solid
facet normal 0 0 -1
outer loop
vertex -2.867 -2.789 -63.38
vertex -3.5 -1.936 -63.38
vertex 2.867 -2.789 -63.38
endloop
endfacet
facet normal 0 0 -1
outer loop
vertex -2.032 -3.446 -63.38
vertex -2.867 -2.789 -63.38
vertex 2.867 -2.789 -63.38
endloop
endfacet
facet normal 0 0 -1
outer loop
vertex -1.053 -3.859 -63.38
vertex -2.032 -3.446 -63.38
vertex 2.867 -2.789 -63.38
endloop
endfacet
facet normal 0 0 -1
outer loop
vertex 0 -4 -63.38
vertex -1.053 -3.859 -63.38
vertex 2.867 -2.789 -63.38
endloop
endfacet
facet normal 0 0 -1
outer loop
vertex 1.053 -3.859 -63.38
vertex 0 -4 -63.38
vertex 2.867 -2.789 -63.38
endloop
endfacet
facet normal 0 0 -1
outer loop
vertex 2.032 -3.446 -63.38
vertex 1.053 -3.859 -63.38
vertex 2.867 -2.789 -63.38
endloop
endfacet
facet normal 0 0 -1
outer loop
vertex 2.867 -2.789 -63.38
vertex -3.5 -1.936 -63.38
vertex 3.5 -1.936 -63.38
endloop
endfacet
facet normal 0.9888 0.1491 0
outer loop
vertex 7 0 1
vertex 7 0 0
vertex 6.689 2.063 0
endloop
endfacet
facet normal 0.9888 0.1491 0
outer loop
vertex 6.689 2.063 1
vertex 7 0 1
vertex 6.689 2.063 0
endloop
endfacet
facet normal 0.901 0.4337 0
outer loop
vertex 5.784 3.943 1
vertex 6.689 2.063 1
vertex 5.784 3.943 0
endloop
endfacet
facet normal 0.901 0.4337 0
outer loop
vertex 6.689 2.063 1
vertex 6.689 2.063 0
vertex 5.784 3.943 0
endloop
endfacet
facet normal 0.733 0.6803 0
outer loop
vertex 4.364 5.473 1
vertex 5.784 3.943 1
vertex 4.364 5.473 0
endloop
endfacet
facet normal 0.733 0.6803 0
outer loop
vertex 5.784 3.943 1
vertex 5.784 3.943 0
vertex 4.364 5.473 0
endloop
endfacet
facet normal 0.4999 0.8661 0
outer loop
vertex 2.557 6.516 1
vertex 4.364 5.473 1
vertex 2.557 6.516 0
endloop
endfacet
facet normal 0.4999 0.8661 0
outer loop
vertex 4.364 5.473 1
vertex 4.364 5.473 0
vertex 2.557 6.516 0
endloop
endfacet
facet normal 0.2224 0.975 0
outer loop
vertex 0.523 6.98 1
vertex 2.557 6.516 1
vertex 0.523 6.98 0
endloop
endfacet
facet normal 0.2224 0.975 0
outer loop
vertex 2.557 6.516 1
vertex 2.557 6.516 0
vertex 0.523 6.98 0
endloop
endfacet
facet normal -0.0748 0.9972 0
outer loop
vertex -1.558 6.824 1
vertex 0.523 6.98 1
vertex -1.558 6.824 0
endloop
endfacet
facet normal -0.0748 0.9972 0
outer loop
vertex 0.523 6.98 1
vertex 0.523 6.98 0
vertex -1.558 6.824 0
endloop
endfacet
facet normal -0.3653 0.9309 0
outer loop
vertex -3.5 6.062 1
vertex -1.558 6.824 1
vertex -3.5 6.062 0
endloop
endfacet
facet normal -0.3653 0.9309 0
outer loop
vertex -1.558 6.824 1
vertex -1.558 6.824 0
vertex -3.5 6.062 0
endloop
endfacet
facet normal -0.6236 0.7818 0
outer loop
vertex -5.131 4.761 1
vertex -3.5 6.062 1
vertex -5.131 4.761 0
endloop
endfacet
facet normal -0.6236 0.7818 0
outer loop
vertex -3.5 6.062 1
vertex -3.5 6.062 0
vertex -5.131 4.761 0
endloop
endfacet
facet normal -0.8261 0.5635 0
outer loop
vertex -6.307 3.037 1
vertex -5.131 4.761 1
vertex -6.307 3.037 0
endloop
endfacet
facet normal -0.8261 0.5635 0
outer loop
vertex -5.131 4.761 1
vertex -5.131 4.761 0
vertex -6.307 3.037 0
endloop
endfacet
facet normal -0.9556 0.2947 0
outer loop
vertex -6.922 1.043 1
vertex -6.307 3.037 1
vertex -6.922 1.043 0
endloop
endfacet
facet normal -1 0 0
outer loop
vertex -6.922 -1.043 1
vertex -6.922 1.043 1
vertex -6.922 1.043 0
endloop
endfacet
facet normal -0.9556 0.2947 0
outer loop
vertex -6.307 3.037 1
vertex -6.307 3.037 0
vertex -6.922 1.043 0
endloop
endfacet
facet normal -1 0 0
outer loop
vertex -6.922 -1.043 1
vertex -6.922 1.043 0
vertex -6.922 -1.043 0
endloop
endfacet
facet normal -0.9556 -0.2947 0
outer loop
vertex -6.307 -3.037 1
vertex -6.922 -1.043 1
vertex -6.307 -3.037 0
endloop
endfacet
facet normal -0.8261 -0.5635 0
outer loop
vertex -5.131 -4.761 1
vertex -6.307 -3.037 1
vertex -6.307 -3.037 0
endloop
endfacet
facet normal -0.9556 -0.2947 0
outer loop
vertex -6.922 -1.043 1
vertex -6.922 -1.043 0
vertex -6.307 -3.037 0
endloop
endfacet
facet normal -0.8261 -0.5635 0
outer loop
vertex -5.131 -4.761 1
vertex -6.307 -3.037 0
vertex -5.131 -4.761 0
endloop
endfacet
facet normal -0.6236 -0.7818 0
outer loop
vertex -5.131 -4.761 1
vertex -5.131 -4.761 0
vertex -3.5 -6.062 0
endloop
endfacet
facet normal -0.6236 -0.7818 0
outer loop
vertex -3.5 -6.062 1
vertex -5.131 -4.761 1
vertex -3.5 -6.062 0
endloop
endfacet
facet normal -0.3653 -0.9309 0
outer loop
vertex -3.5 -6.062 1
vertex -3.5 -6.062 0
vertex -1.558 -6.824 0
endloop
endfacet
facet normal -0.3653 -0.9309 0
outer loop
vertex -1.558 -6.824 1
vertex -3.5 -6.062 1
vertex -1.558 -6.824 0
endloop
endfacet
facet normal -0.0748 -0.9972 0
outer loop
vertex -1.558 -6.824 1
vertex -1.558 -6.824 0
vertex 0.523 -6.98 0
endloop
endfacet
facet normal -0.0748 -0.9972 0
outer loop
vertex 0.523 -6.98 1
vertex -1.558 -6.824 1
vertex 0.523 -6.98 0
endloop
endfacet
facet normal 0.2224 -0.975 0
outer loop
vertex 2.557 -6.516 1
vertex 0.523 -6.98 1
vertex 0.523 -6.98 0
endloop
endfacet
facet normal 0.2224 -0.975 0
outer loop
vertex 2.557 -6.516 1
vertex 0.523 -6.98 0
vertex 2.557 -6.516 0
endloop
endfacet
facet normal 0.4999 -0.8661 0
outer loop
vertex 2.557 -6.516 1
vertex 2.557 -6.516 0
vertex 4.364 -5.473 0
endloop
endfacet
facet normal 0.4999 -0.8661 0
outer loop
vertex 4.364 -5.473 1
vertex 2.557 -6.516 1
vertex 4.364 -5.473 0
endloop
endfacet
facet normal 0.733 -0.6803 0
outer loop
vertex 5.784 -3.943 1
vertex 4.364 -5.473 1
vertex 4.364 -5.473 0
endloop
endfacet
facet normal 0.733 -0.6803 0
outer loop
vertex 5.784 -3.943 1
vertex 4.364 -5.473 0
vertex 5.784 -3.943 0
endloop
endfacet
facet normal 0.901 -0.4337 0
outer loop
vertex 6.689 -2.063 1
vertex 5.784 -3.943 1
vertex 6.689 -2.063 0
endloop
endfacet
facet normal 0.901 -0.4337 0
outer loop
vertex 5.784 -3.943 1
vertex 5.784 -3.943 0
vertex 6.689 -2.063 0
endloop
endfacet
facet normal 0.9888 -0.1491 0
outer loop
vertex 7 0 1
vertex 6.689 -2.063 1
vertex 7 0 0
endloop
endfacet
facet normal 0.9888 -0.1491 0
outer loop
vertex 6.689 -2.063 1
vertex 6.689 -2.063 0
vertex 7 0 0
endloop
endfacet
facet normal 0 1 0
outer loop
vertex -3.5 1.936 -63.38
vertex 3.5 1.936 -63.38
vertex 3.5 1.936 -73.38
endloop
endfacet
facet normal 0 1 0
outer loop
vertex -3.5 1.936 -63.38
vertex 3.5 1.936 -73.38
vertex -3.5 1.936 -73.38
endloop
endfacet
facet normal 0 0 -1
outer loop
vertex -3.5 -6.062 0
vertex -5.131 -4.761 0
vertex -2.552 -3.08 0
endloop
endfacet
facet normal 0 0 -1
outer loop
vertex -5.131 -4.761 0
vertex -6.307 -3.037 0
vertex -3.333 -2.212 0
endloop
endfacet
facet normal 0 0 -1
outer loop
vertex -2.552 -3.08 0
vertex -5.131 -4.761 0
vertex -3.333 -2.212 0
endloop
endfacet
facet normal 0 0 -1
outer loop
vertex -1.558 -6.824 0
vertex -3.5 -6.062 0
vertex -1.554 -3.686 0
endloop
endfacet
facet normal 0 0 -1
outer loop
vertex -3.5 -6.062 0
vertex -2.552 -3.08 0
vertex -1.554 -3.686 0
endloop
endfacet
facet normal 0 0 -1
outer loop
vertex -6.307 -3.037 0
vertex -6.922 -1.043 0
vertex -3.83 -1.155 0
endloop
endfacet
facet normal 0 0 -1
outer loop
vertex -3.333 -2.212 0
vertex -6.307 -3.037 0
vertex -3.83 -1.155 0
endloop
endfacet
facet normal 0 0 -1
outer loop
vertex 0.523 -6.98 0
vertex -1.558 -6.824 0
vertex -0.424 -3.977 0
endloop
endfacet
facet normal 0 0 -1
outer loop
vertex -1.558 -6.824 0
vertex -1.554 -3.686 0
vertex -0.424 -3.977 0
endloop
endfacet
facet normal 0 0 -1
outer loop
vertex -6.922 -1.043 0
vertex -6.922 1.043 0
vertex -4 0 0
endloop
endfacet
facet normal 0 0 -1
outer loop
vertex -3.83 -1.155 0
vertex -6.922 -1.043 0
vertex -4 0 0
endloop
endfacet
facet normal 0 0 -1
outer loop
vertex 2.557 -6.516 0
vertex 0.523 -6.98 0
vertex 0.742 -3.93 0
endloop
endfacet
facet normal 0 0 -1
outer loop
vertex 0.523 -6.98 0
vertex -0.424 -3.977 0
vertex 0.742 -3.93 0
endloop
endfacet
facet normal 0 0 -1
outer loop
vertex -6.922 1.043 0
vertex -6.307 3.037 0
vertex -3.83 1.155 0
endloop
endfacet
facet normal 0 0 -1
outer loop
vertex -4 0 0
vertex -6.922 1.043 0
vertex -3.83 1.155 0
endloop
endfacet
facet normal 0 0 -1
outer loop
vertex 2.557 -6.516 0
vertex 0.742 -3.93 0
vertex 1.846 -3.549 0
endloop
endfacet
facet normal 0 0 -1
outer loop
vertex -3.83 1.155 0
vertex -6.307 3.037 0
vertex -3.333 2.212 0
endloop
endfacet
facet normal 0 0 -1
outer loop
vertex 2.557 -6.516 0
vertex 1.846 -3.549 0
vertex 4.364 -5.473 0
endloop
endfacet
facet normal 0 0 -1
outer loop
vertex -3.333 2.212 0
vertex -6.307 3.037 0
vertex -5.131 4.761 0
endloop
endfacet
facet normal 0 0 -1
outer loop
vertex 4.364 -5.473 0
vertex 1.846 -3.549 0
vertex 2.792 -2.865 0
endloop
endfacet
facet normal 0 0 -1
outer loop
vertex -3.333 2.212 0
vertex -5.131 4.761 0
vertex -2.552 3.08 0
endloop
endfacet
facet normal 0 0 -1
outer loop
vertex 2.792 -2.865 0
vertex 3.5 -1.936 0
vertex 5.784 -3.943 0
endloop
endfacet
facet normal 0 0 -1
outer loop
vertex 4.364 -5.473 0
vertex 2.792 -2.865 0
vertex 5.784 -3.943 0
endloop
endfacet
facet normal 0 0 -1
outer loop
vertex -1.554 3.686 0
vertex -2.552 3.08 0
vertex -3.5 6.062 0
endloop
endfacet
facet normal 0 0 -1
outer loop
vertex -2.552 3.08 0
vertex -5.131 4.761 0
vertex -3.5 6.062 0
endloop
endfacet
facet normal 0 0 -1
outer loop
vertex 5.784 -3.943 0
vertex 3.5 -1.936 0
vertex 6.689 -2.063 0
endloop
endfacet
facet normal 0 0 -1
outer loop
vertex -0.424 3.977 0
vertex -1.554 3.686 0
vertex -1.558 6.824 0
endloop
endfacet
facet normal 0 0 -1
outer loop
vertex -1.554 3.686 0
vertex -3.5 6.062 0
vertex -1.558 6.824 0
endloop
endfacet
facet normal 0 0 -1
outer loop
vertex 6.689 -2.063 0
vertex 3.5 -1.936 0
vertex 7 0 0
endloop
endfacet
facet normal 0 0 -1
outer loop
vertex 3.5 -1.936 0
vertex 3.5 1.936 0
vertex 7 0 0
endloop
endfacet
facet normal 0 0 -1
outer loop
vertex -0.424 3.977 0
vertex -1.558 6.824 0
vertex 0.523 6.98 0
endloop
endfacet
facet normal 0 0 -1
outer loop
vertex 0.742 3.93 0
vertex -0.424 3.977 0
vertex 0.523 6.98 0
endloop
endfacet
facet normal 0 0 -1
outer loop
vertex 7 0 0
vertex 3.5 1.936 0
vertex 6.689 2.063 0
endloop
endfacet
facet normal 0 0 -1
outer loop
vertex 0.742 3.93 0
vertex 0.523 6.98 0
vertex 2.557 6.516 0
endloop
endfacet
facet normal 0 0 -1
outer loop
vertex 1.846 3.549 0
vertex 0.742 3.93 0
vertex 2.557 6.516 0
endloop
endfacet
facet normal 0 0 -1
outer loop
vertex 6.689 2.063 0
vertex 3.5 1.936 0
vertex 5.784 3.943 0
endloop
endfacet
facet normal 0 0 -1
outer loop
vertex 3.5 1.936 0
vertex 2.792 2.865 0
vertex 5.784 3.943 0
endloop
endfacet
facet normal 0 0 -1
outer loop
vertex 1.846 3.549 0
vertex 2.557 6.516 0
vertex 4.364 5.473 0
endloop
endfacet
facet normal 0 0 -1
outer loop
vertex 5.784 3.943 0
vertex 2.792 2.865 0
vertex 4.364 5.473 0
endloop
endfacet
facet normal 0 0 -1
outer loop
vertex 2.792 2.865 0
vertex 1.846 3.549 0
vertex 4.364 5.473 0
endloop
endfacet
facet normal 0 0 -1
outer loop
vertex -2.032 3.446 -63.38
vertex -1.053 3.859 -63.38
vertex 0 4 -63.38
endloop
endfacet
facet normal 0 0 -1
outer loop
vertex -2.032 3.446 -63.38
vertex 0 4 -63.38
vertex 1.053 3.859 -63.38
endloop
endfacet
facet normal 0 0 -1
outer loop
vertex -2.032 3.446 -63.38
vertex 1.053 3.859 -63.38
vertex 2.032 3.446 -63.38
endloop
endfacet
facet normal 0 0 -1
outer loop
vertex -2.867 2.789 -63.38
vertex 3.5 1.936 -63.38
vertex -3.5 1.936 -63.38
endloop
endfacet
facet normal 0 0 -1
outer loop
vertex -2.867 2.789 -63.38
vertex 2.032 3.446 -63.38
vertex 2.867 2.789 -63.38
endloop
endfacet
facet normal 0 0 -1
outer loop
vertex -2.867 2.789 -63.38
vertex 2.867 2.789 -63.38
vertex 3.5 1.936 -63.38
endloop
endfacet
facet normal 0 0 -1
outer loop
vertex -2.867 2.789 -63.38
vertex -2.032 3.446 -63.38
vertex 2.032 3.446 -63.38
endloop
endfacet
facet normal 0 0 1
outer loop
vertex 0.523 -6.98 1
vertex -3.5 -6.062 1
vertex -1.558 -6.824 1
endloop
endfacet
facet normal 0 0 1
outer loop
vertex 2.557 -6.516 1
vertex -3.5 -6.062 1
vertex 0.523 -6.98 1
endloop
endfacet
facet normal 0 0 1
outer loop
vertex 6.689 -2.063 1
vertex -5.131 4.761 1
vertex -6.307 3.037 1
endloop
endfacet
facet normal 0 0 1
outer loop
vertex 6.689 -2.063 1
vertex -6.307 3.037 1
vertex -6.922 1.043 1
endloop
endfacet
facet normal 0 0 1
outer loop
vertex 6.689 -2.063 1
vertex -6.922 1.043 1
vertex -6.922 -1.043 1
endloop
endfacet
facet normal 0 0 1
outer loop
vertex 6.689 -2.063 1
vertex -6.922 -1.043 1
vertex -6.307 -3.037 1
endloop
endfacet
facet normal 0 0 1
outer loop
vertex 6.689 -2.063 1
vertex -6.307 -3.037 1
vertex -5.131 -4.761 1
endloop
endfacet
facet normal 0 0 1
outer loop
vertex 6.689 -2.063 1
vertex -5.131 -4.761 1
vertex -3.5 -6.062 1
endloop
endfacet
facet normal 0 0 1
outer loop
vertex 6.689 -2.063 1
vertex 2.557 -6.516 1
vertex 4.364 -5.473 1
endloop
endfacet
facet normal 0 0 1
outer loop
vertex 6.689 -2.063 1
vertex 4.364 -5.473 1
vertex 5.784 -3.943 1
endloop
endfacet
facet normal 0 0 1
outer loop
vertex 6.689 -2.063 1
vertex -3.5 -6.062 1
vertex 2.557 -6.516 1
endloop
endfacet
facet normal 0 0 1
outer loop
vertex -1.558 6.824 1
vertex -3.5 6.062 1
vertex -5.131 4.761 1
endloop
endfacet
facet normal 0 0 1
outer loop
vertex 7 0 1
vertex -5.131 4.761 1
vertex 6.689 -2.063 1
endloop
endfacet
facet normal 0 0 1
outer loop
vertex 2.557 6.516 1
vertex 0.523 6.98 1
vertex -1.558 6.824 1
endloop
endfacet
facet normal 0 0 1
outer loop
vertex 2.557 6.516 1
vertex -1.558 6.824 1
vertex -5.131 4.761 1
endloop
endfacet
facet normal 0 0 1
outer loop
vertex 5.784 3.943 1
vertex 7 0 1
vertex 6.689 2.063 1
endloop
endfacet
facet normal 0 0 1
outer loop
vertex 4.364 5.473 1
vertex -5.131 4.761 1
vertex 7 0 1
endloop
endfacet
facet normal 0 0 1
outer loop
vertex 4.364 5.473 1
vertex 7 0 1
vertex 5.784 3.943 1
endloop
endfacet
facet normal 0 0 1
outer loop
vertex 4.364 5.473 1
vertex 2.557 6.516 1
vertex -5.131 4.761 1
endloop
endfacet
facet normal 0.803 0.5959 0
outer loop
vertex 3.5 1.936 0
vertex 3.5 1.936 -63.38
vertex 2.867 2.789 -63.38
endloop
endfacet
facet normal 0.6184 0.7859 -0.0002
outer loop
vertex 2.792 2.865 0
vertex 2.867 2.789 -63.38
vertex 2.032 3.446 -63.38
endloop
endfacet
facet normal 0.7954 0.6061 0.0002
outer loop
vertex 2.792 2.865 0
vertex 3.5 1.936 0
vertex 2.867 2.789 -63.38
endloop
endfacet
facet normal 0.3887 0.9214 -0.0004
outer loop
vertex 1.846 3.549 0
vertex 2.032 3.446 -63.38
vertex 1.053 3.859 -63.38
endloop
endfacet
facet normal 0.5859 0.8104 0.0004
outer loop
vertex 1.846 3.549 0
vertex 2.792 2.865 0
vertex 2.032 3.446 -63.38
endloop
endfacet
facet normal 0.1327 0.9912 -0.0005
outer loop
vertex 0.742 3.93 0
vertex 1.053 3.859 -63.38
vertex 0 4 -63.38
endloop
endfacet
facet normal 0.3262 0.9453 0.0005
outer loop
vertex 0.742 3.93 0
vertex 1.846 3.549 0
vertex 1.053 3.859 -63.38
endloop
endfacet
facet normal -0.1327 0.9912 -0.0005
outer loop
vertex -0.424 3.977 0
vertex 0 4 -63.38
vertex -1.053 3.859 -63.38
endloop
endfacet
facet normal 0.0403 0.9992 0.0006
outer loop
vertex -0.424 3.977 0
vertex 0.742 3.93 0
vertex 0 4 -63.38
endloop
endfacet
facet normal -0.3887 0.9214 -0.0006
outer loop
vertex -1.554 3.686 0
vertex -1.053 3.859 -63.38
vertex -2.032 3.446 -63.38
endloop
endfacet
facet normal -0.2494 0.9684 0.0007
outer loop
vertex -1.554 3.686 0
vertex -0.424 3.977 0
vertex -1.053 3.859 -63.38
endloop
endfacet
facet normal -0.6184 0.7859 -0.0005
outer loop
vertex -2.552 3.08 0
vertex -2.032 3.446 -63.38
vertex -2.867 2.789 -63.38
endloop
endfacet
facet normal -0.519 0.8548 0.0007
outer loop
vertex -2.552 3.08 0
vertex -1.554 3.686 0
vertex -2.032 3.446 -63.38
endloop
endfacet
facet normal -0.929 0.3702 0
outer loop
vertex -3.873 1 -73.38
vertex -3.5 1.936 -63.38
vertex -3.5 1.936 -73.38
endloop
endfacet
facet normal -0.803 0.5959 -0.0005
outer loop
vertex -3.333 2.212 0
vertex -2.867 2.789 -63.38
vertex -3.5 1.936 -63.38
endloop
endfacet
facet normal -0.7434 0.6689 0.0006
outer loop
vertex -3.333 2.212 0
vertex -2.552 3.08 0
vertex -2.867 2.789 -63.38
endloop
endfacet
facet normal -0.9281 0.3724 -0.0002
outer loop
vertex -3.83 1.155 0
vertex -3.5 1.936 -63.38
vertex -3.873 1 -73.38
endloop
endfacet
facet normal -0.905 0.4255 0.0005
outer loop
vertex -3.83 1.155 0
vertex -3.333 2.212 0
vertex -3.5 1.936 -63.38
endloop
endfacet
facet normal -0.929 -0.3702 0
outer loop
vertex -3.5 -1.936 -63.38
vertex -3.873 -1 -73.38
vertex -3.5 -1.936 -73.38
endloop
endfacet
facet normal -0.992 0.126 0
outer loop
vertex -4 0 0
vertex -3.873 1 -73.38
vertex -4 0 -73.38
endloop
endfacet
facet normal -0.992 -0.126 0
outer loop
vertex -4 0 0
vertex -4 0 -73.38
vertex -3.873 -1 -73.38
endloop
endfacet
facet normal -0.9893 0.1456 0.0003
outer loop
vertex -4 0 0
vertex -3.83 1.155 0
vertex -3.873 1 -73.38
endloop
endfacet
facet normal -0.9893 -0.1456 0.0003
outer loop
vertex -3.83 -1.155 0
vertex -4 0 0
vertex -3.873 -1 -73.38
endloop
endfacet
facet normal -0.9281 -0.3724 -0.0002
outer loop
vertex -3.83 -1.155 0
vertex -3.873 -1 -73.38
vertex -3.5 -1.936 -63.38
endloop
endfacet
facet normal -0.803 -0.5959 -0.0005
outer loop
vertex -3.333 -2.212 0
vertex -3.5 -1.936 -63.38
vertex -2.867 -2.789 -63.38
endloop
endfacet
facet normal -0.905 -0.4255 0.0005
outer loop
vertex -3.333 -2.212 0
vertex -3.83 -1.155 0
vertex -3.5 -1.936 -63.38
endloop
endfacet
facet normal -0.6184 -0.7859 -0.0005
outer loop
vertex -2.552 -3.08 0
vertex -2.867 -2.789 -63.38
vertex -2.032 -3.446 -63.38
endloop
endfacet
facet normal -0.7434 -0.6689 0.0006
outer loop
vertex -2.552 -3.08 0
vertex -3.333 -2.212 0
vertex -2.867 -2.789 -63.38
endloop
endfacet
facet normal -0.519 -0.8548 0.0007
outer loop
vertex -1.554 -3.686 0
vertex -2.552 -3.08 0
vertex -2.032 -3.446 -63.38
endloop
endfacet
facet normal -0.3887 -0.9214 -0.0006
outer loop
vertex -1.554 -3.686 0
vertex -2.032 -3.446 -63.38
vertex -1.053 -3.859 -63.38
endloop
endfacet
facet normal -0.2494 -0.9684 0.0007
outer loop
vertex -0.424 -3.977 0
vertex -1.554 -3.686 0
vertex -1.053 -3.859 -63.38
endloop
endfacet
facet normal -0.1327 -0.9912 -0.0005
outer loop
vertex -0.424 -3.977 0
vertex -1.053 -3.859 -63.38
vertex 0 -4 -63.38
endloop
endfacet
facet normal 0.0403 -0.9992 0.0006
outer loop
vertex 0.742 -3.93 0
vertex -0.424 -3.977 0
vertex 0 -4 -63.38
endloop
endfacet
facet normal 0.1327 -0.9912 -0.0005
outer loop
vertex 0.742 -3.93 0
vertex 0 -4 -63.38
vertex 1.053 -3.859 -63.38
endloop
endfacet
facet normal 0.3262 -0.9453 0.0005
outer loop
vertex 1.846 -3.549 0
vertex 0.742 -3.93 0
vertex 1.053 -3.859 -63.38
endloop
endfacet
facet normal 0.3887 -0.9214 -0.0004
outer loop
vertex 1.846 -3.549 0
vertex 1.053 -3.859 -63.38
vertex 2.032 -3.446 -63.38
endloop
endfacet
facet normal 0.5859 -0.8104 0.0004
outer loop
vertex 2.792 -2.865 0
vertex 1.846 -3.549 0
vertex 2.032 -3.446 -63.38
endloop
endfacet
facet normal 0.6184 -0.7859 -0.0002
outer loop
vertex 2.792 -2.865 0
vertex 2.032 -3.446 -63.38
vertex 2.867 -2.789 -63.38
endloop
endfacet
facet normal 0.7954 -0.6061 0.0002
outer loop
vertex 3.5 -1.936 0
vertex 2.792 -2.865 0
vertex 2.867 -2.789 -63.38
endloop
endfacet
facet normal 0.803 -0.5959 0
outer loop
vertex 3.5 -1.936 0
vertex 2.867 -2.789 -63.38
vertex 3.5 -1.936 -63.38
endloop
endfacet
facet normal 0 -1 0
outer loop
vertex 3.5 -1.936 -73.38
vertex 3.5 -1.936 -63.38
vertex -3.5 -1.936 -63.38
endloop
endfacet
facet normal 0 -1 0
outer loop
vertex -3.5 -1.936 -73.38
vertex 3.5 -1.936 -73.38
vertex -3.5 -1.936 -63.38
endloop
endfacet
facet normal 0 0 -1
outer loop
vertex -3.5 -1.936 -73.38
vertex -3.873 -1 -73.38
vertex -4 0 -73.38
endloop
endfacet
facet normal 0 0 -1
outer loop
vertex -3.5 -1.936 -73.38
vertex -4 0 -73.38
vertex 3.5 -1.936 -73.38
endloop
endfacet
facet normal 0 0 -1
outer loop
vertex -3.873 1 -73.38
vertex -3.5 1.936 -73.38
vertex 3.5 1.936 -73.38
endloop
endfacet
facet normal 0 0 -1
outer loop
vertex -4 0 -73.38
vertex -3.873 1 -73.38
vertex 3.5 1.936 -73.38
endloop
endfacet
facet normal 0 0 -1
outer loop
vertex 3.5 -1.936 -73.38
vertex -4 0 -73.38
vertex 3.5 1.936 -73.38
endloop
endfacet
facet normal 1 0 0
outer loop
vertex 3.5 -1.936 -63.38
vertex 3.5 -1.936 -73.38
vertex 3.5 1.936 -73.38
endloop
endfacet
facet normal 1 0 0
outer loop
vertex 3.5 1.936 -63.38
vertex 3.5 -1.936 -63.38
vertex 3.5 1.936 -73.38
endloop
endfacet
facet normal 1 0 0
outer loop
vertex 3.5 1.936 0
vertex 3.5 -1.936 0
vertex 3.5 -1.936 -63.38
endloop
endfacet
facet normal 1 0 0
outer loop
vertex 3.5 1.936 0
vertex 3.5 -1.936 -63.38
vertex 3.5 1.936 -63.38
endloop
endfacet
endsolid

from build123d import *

# Parameters (mm, degrees)
BOSS_EXTRUDE1_DEPTH = 73.3796339
SKETCH2_R           = 7
BOSS_EXTRUDE2_DEPTH = 1
CUT_EXTRUDE1_START  = -10
CUT_EXTRUDE1_DEPTH  = 10


with BuildPart() as part:
    # Sketch1 → Boss-Extrude1 (new body)
    with BuildSketch(Plane.XY):
        with BuildLine():
            Line((3.5, -1.936491673), (3.5, 1.936491673))
            ThreePointArc((3.5, 1.936491673), (-4, 0), (3.5, -1.936491673))
        make_face()
    extrude(amount=-BOSS_EXTRUDE1_DEPTH)

    # Sketch2 → Boss-Extrude2 (add)
    with BuildSketch(Plane.XY):
        Circle(SKETCH2_R)
    extrude(amount=BOSS_EXTRUDE2_DEPTH)

    # Sketch3 → Cut-Extrude1 (cut)
    with BuildSketch(Plane(origin=(0, 0, -73.3796339), x_dir=(-1, 0, 0), z_dir=(0, 0, -1)).offset(CUT_EXTRUDE1_START)):
        with BuildLine():
            Line((-3.5, 1.936491673), (3.5, 1.936491673))
            ThreePointArc((3.5, 1.936491673), (0, 4), (-3.5, 1.936491673))
        make_face()
        with BuildLine():
            Line((-3.5, -1.936491673), (3.5, -1.936491673))
            ThreePointArc((3.5, -1.936491673), (0, -4), (-3.5, -1.936491673))
        make_face()
    extrude(amount=CUT_EXTRUDE1_DEPTH, mode=Mode.SUBTRACT)


solid = part.part
